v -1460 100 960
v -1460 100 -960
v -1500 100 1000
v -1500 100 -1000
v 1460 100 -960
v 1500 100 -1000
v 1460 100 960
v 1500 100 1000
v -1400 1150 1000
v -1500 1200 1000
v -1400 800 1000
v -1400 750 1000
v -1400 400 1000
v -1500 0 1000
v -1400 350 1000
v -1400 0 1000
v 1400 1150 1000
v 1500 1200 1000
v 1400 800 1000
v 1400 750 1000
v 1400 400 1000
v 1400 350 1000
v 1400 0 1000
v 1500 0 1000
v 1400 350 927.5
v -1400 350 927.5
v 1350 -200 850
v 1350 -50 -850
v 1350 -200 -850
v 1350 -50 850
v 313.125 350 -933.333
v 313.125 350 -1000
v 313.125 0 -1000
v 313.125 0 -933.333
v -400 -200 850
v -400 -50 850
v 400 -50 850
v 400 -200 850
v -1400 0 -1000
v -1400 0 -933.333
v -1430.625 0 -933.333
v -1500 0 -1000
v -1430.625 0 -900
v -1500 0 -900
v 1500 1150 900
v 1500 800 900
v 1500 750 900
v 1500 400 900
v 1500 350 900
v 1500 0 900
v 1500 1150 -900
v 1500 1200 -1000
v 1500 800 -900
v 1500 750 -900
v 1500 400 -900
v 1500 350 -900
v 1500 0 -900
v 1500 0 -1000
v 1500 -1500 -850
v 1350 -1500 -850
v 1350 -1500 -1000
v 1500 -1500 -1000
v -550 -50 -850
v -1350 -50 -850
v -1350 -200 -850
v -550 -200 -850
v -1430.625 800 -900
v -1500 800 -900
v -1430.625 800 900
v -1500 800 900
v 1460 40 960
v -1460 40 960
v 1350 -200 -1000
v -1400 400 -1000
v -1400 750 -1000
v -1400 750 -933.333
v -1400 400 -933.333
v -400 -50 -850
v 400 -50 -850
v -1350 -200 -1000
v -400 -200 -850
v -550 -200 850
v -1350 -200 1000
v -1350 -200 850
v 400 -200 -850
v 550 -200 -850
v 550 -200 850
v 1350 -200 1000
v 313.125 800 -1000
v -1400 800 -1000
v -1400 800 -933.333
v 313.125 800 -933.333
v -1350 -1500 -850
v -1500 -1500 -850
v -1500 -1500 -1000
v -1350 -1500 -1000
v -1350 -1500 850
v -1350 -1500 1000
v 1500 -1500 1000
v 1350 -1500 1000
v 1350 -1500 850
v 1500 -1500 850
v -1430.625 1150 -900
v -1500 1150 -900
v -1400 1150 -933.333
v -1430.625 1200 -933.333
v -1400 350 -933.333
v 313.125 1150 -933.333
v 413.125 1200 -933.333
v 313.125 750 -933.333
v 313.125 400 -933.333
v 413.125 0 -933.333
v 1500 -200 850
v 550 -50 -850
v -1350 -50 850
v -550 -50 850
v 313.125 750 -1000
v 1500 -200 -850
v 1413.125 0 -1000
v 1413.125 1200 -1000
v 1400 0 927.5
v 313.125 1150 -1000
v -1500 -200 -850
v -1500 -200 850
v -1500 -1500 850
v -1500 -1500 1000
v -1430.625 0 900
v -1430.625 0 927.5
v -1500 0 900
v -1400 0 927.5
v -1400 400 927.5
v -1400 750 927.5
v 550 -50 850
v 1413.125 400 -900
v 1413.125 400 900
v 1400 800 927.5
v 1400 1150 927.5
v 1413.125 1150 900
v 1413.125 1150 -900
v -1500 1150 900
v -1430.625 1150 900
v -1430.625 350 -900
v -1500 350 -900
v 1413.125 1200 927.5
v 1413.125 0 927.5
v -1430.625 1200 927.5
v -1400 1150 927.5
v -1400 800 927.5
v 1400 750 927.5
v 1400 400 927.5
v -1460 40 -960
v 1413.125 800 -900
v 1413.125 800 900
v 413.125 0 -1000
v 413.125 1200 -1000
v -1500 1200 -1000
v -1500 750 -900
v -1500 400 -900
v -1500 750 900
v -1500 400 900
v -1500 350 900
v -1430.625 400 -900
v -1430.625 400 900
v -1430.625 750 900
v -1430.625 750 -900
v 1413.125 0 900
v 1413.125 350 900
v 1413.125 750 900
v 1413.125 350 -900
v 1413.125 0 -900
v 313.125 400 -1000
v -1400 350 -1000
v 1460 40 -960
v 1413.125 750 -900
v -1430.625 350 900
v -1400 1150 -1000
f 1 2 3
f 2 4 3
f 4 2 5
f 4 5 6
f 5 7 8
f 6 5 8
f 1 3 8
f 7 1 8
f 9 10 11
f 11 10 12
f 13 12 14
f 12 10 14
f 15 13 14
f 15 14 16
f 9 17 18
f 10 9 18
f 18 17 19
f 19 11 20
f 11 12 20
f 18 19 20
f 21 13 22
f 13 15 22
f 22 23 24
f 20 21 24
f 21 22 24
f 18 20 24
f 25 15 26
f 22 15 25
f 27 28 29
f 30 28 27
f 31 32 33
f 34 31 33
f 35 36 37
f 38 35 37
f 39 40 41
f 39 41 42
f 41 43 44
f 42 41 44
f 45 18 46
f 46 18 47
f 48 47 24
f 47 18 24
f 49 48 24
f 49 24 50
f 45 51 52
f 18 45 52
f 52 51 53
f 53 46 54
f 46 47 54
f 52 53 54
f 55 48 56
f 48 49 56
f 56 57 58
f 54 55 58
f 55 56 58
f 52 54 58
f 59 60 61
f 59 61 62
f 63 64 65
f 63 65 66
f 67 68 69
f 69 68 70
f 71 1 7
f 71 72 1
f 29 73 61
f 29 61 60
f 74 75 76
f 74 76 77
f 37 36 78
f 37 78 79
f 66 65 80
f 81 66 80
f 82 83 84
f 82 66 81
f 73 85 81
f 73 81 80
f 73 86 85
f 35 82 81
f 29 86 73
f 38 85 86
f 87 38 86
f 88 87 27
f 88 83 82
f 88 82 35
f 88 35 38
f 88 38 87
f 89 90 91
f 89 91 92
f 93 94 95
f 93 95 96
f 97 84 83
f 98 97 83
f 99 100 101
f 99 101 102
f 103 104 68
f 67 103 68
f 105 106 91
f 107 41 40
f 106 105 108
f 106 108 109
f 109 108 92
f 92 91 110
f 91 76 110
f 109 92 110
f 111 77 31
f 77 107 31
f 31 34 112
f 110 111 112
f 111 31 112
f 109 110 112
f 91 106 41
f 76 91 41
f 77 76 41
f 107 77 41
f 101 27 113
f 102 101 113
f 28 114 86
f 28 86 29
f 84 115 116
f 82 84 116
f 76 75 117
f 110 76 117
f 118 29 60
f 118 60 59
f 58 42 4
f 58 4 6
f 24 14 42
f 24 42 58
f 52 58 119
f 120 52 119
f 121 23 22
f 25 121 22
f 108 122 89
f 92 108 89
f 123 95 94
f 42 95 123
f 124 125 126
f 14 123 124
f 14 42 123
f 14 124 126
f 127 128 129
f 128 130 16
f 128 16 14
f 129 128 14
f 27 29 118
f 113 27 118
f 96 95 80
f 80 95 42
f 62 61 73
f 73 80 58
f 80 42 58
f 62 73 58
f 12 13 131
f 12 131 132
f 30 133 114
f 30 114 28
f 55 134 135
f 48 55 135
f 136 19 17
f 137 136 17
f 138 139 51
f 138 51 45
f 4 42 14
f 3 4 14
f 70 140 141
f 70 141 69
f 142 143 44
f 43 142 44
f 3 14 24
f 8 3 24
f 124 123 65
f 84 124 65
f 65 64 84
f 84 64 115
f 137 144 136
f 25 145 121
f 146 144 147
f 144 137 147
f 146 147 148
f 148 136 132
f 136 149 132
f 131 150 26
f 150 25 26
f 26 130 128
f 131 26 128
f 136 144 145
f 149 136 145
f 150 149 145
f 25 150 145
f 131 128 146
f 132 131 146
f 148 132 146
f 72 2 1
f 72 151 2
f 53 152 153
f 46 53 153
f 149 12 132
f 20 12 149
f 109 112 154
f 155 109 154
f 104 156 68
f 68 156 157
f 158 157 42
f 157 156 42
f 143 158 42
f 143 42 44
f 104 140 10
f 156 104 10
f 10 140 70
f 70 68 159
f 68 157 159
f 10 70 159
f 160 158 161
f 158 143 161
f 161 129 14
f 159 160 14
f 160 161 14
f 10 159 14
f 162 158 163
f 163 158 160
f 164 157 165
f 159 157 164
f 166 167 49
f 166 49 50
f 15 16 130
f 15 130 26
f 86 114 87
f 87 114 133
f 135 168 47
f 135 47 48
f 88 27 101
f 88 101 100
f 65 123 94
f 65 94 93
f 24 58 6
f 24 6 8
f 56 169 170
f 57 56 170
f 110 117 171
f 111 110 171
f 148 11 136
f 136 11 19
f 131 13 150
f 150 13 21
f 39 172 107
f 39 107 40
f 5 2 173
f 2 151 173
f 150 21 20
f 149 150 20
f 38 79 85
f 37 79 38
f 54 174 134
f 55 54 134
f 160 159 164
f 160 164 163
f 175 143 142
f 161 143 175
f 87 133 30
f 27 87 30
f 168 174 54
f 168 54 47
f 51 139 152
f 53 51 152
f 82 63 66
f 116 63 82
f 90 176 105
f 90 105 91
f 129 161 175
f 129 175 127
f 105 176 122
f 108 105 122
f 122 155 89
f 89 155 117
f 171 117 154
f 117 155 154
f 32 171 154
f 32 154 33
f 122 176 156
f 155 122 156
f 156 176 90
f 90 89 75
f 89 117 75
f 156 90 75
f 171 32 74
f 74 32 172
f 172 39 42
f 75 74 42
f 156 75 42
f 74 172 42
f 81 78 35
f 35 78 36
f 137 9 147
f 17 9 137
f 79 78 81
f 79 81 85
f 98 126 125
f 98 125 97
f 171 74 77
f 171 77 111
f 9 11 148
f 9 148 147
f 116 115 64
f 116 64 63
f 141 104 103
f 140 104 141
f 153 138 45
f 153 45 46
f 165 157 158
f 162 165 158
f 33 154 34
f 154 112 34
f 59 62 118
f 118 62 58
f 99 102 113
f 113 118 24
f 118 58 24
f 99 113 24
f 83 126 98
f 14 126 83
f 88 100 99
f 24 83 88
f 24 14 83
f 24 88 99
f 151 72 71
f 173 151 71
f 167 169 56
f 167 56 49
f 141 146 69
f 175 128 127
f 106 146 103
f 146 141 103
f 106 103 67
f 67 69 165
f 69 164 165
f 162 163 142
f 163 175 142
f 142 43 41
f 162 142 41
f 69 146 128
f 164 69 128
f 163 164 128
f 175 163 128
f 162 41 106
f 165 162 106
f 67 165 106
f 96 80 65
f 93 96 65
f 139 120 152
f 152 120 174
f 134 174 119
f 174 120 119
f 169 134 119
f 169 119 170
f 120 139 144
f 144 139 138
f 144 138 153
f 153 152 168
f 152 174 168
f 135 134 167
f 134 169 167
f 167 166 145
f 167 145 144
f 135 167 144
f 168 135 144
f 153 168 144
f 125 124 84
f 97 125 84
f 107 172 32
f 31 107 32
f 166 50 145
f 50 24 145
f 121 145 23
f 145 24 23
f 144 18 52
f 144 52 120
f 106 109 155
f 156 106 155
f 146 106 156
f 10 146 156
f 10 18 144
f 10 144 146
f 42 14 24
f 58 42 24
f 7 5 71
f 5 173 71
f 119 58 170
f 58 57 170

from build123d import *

# Parameters (mm, degrees)
F0_W      = 3000
F0_H      = 2000
F1_DEPTH  = 50
F2_W      = 150
F2_H      = 150
F3_DEPTH  = 1450
F5_DEPTH  = 1200
F6_W      = 350
F6_H      = 1800
F7_DEPTH  = 3000.001
F8_W      = 1713.125038147
F8_H      = 350
F9_DEPTH  = 110
F10_W     = 2800
F10_H     = 350
F11_DEPTH = 110
F12_DEPTH = 100
F13_W     = 150
F13_H     = 1700
F13_W_2   = 2700
F13_H_2   = 150
F14_DEPTH = 150
F15_W     = 150
F15_H     = 1700
F16_DEPTH = 150
F17_T     = -40


with BuildPart() as f1:
    # F0 (on Front) → F1 (new body)
    with BuildSketch(Plane.XZ):
        Rectangle(F0_W, F0_H)
    extrude(amount=F1_DEPTH)

    # F2 (on face) → F3 (join)
    with BuildSketch(Plane.XZ.offset(50)):
        with Locations((-1425, 925)):
            Rectangle(F2_W, F2_H)
        with Locations((1425, 925)):
            Rectangle(F2_W, F2_H)
        with Locations((-1425, -925)):
            Rectangle(F2_W, F2_H)
        with Locations((1425, -925)):
            Rectangle(F2_W, F2_H)
    extrude(amount=F3_DEPTH)


with BuildPart() as f5:
    # F4 (on face) → F5 (new body)
    with BuildSketch(Plane(origin=(0, 0, 0), x_dir=(-1, 0, 0), z_dir=(0, 1, 0))):
        Polygon((-1413.125038147, -1000), (-1413.125038147, 927.5000095367), (1430.624961853, 927.5000095367), (1430.624961853, -933.333337307), (-413.125038147, -933.333337307), (-413.125038147, -1000), (1500, -1000), (1500, 1000), (-1500, 1000), (-1500, -1000), align=None)
    extrude(amount=F5_DEPTH)

    # F6 (on face) → F7 (cut, through all)
    with BuildSketch(Plane(origin=(-1500, 0, 0), x_dir=(0, -1, 0), z_dir=(-1, 0, 0))):
        with Locations((-975, 0)):
            Rectangle(F6_W, F6_H)
        with Locations((-575, 0)):
            Rectangle(F6_W, F6_H)
        with Locations((-175, 0)):
            Rectangle(F6_W, F6_H)
    extrude(amount=-F7_DEPTH, mode=Mode.SUBTRACT)

    # F8 (on face) → F9 (cut)
    with BuildSketch(Plane(origin=(0, 0, -1000), x_dir=(1, 0, 0), z_dir=(0, 0, -1))):
        with Locations((-543.4374809265, -975)):
            Rectangle(F8_W, F8_H)
        with Locations((-543.4374809265, -175)):
            Rectangle(F8_W, F8_H)
        with Locations((-543.4374809265, -575)):
            Rectangle(F8_W, F8_H)
    extrude(amount=-F9_DEPTH, mode=Mode.SUBTRACT)

    # F10 (on face) → F11 (cut)
    with BuildSketch(Plane.XY.offset(1000)):
        with Locations((0, 975)):
            Rectangle(F10_W, F10_H)
        with Locations((0, 575)):
            Rectangle(F10_W, F10_H)
        with Locations((0, 175)):
            Rectangle(F10_W, F10_H)
    extrude(amount=-F11_DEPTH, mode=Mode.SUBTRACT)


with BuildPart() as f12:
    # F12 (new): a face of the model
    f12_faces = [f1.part.faces().sort_by_distance(p)[0] for p in [
        (0, 0, 0),
    ]]
    extrude(f12_faces, amount=F12_DEPTH)

    # F17
    f17_openings = [f12.faces().sort_by_distance(p)[0] for p in [
        (0, 100, 0),
    ]]
    offset(amount=F17_T, openings=f17_openings)


with BuildPart() as f1_1:
    add(f1.part)

    # F13 (on face) → F14 (join)
    with BuildSketch(Plane.XZ.offset(50)):
        with Locations((-1425, 0)):
            Rectangle(F13_W, F13_H)
        with Locations((0, 925)):
            Rectangle(F13_W_2, F13_H_2)
        with Locations((1425, 0)):
            Rectangle(F13_W, F13_H)
        with Locations((0, -925)):
            Rectangle(F13_W_2, F13_H_2)
    extrude(amount=F14_DEPTH)

    # F15 (on face) → F16 (join)
    with BuildSketch(Plane.XZ.offset(50)):
        with Locations((-475, 0)):
            Rectangle(F15_W, F15_H)
        with Locations((475, 0)):
            Rectangle(F15_W, F15_H)
    extrude(amount=F16_DEPTH)


solid = Compound([f5.part, f12.part, f1_1.part])
